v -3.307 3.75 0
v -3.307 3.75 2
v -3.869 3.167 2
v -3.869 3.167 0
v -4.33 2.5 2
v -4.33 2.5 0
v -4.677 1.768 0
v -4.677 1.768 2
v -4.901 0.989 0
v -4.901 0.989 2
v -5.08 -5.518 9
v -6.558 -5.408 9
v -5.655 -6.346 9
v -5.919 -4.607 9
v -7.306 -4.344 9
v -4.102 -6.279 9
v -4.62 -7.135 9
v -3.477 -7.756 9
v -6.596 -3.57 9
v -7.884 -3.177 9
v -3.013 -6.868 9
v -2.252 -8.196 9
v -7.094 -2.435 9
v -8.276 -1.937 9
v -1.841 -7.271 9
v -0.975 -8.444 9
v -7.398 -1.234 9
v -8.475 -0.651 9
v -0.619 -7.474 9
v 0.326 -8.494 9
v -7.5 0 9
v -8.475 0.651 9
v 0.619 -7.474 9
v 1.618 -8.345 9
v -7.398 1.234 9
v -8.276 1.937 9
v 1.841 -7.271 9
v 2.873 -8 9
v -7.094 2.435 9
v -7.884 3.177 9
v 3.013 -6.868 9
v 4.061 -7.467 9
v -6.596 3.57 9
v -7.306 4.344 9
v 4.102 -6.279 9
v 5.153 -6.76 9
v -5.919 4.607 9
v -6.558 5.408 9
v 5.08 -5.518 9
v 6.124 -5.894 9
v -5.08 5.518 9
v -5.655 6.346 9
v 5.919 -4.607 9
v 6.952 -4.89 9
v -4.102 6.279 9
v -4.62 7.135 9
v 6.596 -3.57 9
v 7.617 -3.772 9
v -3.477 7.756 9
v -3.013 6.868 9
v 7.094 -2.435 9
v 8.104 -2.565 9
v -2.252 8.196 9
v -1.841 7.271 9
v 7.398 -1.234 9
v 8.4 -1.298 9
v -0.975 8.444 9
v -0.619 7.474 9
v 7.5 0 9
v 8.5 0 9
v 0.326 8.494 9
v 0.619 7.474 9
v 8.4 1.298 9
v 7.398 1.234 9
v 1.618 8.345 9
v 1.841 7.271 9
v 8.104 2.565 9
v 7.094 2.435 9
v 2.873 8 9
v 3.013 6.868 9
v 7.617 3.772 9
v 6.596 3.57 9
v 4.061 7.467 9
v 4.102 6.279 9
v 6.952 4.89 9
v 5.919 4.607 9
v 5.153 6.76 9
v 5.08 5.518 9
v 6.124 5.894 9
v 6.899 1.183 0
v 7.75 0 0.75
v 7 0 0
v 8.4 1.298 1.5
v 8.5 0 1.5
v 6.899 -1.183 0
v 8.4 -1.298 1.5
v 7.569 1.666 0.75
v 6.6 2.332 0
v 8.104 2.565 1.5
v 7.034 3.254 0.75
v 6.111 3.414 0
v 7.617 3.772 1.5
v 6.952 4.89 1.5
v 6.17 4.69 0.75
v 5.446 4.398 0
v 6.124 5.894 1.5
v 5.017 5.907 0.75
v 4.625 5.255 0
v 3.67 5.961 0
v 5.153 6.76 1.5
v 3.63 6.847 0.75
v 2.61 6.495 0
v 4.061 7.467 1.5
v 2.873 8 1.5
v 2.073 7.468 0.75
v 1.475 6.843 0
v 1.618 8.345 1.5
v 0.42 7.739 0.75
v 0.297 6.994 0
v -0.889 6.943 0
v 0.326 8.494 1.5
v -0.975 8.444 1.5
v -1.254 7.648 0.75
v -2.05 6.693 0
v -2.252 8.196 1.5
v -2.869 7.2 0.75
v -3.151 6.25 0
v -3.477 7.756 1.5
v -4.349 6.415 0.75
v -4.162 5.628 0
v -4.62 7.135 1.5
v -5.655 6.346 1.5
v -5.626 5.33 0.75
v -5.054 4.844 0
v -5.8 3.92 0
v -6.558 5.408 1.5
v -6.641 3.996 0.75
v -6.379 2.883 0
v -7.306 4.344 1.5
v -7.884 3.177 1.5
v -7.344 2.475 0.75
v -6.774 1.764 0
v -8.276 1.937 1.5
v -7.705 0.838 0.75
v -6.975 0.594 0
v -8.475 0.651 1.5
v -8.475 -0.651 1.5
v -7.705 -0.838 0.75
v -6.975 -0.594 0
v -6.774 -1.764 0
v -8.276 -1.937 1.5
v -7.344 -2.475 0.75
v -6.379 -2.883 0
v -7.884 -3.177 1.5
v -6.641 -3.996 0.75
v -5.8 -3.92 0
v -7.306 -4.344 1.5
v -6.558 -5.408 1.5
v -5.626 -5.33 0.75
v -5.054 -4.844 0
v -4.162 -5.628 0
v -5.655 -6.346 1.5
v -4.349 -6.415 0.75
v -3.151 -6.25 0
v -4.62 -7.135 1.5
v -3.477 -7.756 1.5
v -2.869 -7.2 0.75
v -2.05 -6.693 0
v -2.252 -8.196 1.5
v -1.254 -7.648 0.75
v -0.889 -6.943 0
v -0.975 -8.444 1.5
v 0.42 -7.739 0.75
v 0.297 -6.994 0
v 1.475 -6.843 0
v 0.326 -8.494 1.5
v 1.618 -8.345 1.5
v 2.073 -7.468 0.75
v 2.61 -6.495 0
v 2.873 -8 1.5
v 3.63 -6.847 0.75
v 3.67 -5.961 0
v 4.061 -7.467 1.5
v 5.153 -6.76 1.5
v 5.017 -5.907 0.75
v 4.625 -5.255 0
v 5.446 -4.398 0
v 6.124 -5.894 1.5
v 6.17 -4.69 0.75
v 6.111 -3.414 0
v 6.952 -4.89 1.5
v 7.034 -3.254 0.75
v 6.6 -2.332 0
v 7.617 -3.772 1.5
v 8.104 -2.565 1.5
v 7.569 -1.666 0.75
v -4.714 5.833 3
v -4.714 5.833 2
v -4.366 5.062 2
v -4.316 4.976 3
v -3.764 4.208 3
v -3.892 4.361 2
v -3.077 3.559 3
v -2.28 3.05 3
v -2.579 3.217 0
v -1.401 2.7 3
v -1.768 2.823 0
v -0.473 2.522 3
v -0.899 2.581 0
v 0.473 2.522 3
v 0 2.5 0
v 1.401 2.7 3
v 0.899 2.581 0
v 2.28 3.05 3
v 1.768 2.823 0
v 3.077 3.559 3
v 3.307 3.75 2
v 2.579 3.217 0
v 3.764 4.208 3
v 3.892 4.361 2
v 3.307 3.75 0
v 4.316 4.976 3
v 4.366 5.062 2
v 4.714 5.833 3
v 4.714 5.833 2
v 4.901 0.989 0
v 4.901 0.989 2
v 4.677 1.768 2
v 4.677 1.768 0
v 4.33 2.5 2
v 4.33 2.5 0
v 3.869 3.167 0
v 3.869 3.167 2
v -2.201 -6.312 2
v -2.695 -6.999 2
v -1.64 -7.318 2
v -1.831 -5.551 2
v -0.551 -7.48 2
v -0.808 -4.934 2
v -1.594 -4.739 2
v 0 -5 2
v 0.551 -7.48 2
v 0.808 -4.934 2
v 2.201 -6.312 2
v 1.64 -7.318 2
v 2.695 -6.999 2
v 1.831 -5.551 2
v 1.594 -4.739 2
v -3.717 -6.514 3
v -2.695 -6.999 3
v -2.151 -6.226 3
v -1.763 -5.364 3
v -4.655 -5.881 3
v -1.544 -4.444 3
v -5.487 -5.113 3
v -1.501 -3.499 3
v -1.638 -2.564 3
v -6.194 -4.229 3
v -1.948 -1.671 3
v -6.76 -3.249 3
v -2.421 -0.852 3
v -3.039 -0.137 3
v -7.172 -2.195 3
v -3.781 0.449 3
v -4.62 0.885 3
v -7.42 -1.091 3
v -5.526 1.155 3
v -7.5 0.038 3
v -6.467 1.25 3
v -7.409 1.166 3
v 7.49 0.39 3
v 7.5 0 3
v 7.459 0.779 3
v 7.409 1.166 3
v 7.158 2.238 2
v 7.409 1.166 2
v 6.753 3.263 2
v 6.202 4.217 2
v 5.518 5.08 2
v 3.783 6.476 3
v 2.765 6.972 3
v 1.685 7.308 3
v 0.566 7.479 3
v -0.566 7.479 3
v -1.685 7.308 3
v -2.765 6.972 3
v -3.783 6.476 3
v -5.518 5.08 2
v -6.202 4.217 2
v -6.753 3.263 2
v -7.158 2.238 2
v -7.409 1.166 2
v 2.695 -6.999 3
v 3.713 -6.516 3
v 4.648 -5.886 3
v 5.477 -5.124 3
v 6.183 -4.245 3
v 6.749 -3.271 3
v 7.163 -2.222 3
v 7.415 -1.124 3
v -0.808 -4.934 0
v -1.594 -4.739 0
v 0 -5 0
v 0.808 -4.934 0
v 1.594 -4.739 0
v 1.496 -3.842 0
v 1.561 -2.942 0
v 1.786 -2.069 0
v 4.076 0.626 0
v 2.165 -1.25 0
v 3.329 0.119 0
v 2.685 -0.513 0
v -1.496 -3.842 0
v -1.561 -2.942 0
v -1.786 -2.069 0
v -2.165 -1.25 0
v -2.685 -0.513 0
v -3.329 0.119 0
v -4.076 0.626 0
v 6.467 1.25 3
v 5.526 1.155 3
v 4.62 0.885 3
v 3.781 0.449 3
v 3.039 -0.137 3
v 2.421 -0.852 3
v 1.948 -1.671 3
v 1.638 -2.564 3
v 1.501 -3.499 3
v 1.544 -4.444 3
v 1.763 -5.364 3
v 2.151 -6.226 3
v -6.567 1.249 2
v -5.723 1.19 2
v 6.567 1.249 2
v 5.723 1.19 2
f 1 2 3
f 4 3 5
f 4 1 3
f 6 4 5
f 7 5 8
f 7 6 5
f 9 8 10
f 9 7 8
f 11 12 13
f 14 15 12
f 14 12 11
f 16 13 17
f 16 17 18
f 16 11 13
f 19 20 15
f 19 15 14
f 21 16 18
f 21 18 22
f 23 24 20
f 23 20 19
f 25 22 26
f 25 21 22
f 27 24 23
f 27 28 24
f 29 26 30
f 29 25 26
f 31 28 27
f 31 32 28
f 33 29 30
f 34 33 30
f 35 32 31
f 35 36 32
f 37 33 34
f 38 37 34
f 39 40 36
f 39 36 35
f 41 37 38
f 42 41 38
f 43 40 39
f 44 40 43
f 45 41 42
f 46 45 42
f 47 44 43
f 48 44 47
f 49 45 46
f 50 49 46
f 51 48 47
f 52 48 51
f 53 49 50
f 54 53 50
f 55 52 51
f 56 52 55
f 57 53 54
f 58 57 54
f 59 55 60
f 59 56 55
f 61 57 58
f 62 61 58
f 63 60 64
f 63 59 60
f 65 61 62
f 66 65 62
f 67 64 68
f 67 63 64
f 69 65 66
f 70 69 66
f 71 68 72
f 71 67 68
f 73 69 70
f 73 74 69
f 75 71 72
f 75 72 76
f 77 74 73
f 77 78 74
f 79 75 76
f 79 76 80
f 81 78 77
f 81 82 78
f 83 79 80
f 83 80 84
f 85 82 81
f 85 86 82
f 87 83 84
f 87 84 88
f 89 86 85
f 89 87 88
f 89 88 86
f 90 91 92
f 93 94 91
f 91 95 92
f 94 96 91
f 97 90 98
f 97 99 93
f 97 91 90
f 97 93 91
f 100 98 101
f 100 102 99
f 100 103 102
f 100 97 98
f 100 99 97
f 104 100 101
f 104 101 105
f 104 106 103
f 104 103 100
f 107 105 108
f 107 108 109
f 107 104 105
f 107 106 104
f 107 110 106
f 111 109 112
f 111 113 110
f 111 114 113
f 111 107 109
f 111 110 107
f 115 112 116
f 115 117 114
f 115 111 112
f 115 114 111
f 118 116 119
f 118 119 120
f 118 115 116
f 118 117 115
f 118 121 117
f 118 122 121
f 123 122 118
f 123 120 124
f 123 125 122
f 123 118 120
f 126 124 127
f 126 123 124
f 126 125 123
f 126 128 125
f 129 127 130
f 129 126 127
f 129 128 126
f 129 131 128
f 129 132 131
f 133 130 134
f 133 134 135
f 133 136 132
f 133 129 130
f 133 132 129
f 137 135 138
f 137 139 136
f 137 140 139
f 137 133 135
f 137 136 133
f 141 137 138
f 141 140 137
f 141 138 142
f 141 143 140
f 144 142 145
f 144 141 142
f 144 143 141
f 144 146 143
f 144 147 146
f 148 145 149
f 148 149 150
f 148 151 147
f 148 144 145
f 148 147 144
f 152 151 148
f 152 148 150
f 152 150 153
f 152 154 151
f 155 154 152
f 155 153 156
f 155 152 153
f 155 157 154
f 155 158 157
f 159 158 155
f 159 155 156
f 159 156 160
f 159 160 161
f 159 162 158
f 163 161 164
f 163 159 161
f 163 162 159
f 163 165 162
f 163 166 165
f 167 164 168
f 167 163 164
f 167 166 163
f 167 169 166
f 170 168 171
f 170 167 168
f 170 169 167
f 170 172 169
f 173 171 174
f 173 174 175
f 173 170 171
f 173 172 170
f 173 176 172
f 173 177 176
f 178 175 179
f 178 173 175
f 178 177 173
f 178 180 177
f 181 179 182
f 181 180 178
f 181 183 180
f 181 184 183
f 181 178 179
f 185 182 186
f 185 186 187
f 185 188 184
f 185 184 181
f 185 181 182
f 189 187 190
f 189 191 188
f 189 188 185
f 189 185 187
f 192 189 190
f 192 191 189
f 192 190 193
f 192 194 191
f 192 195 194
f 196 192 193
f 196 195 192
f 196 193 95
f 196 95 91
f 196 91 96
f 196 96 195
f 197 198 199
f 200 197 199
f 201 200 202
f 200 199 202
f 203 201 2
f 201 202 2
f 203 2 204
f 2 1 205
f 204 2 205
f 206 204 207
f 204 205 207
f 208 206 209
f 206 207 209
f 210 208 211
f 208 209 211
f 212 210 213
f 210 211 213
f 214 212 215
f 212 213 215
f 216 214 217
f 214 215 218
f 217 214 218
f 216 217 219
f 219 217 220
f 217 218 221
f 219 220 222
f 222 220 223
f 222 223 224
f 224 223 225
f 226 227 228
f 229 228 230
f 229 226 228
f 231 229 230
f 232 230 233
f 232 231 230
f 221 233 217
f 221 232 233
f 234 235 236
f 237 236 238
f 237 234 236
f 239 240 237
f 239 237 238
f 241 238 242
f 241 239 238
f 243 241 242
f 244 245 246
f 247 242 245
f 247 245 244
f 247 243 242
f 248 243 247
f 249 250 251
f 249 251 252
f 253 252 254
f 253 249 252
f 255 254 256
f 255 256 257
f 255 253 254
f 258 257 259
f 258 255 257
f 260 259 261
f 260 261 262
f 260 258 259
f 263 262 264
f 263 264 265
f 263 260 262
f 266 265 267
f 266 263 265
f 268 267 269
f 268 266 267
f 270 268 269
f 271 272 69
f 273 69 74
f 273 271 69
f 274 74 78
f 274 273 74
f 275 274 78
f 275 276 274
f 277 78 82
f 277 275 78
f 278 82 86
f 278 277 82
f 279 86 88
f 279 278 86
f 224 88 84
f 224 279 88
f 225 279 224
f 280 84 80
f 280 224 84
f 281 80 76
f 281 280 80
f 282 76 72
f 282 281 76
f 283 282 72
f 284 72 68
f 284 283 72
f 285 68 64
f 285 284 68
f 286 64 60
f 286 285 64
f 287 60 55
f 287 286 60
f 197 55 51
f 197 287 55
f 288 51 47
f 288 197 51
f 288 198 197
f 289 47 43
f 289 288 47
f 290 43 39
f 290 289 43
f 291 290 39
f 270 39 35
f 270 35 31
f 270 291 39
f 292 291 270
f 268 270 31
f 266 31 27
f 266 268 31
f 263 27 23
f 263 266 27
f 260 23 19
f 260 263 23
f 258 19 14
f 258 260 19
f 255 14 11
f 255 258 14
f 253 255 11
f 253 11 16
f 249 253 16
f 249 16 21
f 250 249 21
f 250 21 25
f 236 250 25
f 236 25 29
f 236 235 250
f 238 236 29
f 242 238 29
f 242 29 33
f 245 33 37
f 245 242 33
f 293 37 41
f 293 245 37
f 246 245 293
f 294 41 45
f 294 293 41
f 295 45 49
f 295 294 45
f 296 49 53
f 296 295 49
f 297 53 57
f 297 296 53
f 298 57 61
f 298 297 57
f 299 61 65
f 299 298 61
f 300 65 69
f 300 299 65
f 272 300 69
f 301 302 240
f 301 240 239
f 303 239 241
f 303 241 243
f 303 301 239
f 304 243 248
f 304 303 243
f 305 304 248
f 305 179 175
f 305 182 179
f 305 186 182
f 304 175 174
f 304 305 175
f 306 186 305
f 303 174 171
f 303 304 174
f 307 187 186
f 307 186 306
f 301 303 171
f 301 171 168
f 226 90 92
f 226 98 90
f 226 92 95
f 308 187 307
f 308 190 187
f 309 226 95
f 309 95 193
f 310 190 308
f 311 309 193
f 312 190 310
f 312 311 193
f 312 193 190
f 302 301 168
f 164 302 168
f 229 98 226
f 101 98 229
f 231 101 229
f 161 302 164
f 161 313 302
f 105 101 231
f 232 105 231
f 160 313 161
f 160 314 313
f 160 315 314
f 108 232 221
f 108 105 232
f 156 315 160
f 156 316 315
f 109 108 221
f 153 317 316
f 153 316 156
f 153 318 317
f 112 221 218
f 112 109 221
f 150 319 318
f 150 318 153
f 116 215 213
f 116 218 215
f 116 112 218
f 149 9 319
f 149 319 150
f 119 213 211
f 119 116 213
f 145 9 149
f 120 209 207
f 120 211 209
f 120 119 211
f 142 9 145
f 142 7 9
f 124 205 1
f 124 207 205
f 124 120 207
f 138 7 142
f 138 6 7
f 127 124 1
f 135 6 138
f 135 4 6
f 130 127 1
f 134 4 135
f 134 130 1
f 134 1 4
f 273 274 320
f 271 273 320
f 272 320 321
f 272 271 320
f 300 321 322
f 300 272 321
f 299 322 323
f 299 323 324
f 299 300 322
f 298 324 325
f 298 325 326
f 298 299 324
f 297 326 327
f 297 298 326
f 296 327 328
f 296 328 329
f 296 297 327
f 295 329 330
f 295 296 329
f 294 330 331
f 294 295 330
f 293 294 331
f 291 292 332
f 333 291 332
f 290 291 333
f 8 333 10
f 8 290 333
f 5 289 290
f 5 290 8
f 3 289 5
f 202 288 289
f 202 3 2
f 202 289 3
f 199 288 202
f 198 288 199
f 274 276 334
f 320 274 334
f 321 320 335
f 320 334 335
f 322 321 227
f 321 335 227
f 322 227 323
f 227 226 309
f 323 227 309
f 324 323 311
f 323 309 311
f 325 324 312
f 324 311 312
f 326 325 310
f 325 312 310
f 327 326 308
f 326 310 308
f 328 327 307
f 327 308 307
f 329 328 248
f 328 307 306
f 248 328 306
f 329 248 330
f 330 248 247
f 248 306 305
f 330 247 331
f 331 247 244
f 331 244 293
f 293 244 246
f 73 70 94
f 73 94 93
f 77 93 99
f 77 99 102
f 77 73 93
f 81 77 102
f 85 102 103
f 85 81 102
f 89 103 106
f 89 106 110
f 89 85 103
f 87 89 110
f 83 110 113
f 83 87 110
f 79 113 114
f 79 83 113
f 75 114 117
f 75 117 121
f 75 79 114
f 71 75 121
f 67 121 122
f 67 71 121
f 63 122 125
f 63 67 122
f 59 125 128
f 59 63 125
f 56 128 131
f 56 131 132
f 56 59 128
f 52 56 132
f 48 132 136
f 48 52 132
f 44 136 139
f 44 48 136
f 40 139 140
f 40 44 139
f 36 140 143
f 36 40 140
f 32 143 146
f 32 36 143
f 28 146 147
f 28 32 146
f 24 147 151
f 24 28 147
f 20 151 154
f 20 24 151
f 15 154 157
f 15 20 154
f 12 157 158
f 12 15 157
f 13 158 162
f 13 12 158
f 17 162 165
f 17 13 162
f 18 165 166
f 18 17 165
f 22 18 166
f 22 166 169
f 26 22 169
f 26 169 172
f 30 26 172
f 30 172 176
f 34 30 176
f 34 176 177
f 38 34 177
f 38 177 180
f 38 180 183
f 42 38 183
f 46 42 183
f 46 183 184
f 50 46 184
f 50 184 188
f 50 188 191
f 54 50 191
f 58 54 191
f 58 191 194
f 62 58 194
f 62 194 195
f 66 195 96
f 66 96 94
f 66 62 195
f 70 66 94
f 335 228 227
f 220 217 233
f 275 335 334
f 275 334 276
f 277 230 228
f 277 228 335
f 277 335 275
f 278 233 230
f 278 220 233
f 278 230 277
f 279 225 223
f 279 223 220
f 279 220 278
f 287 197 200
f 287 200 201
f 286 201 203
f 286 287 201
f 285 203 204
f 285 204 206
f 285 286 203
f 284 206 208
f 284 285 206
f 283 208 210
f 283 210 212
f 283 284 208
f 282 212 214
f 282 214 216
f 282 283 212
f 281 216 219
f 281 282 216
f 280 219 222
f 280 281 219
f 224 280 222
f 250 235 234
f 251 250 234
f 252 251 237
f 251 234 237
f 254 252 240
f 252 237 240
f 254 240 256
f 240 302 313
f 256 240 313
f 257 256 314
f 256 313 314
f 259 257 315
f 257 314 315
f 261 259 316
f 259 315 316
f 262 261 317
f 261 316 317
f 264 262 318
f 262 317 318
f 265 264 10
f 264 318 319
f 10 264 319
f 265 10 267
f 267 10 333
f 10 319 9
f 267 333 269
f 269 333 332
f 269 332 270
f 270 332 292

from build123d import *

# Parameters (mm, degrees)
PAD_DEPTH          = 3
POLARPATTERN_COUNT = 3
CHAMFER_SIZE       = 1.5


with BuildPart() as part:
    # Sketch → Revolution (revolve)
    with BuildSketch(Plane.XZ):
        Polygon((5, 0), (8.5, 0), (8.5, 9), (7.5, 9), (7.5, 2), (5, 2), align=None)
    revolve(axis=Axis((0, 0, 0), (0, 0, 1)))

    # Sketch001 → Pad (new body)
    with BuildSketch(Plane.XY):
        with BuildLine():
            ThreePointArc((-4.7140452079, 5.8333333333), (0, 2.5), (4.7140452079, 5.8333333333))
            ThreePointArc((4.7140452079, 5.8333333333), (0, 7.5), (-4.7140452079, 5.8333333333))
        make_face()
    pad = extrude(amount=PAD_DEPTH)

    # PolarPattern: Pad ×3 about axis
    polarpattern_axis = Axis((0, 0, 0), (0, 0, 1))
    for i in range(1, POLARPATTERN_COUNT):
        add(pad.rotate(polarpattern_axis, i * 360 / POLARPATTERN_COUNT))

    # Chamfer
    chamfer_edges = [part.edges().sort_by_distance(p)[0] for p in [
        (-8.5, 0, 0),
    ]]
    chamfer(chamfer_edges, length=CHAMFER_SIZE)


solid = part.part
